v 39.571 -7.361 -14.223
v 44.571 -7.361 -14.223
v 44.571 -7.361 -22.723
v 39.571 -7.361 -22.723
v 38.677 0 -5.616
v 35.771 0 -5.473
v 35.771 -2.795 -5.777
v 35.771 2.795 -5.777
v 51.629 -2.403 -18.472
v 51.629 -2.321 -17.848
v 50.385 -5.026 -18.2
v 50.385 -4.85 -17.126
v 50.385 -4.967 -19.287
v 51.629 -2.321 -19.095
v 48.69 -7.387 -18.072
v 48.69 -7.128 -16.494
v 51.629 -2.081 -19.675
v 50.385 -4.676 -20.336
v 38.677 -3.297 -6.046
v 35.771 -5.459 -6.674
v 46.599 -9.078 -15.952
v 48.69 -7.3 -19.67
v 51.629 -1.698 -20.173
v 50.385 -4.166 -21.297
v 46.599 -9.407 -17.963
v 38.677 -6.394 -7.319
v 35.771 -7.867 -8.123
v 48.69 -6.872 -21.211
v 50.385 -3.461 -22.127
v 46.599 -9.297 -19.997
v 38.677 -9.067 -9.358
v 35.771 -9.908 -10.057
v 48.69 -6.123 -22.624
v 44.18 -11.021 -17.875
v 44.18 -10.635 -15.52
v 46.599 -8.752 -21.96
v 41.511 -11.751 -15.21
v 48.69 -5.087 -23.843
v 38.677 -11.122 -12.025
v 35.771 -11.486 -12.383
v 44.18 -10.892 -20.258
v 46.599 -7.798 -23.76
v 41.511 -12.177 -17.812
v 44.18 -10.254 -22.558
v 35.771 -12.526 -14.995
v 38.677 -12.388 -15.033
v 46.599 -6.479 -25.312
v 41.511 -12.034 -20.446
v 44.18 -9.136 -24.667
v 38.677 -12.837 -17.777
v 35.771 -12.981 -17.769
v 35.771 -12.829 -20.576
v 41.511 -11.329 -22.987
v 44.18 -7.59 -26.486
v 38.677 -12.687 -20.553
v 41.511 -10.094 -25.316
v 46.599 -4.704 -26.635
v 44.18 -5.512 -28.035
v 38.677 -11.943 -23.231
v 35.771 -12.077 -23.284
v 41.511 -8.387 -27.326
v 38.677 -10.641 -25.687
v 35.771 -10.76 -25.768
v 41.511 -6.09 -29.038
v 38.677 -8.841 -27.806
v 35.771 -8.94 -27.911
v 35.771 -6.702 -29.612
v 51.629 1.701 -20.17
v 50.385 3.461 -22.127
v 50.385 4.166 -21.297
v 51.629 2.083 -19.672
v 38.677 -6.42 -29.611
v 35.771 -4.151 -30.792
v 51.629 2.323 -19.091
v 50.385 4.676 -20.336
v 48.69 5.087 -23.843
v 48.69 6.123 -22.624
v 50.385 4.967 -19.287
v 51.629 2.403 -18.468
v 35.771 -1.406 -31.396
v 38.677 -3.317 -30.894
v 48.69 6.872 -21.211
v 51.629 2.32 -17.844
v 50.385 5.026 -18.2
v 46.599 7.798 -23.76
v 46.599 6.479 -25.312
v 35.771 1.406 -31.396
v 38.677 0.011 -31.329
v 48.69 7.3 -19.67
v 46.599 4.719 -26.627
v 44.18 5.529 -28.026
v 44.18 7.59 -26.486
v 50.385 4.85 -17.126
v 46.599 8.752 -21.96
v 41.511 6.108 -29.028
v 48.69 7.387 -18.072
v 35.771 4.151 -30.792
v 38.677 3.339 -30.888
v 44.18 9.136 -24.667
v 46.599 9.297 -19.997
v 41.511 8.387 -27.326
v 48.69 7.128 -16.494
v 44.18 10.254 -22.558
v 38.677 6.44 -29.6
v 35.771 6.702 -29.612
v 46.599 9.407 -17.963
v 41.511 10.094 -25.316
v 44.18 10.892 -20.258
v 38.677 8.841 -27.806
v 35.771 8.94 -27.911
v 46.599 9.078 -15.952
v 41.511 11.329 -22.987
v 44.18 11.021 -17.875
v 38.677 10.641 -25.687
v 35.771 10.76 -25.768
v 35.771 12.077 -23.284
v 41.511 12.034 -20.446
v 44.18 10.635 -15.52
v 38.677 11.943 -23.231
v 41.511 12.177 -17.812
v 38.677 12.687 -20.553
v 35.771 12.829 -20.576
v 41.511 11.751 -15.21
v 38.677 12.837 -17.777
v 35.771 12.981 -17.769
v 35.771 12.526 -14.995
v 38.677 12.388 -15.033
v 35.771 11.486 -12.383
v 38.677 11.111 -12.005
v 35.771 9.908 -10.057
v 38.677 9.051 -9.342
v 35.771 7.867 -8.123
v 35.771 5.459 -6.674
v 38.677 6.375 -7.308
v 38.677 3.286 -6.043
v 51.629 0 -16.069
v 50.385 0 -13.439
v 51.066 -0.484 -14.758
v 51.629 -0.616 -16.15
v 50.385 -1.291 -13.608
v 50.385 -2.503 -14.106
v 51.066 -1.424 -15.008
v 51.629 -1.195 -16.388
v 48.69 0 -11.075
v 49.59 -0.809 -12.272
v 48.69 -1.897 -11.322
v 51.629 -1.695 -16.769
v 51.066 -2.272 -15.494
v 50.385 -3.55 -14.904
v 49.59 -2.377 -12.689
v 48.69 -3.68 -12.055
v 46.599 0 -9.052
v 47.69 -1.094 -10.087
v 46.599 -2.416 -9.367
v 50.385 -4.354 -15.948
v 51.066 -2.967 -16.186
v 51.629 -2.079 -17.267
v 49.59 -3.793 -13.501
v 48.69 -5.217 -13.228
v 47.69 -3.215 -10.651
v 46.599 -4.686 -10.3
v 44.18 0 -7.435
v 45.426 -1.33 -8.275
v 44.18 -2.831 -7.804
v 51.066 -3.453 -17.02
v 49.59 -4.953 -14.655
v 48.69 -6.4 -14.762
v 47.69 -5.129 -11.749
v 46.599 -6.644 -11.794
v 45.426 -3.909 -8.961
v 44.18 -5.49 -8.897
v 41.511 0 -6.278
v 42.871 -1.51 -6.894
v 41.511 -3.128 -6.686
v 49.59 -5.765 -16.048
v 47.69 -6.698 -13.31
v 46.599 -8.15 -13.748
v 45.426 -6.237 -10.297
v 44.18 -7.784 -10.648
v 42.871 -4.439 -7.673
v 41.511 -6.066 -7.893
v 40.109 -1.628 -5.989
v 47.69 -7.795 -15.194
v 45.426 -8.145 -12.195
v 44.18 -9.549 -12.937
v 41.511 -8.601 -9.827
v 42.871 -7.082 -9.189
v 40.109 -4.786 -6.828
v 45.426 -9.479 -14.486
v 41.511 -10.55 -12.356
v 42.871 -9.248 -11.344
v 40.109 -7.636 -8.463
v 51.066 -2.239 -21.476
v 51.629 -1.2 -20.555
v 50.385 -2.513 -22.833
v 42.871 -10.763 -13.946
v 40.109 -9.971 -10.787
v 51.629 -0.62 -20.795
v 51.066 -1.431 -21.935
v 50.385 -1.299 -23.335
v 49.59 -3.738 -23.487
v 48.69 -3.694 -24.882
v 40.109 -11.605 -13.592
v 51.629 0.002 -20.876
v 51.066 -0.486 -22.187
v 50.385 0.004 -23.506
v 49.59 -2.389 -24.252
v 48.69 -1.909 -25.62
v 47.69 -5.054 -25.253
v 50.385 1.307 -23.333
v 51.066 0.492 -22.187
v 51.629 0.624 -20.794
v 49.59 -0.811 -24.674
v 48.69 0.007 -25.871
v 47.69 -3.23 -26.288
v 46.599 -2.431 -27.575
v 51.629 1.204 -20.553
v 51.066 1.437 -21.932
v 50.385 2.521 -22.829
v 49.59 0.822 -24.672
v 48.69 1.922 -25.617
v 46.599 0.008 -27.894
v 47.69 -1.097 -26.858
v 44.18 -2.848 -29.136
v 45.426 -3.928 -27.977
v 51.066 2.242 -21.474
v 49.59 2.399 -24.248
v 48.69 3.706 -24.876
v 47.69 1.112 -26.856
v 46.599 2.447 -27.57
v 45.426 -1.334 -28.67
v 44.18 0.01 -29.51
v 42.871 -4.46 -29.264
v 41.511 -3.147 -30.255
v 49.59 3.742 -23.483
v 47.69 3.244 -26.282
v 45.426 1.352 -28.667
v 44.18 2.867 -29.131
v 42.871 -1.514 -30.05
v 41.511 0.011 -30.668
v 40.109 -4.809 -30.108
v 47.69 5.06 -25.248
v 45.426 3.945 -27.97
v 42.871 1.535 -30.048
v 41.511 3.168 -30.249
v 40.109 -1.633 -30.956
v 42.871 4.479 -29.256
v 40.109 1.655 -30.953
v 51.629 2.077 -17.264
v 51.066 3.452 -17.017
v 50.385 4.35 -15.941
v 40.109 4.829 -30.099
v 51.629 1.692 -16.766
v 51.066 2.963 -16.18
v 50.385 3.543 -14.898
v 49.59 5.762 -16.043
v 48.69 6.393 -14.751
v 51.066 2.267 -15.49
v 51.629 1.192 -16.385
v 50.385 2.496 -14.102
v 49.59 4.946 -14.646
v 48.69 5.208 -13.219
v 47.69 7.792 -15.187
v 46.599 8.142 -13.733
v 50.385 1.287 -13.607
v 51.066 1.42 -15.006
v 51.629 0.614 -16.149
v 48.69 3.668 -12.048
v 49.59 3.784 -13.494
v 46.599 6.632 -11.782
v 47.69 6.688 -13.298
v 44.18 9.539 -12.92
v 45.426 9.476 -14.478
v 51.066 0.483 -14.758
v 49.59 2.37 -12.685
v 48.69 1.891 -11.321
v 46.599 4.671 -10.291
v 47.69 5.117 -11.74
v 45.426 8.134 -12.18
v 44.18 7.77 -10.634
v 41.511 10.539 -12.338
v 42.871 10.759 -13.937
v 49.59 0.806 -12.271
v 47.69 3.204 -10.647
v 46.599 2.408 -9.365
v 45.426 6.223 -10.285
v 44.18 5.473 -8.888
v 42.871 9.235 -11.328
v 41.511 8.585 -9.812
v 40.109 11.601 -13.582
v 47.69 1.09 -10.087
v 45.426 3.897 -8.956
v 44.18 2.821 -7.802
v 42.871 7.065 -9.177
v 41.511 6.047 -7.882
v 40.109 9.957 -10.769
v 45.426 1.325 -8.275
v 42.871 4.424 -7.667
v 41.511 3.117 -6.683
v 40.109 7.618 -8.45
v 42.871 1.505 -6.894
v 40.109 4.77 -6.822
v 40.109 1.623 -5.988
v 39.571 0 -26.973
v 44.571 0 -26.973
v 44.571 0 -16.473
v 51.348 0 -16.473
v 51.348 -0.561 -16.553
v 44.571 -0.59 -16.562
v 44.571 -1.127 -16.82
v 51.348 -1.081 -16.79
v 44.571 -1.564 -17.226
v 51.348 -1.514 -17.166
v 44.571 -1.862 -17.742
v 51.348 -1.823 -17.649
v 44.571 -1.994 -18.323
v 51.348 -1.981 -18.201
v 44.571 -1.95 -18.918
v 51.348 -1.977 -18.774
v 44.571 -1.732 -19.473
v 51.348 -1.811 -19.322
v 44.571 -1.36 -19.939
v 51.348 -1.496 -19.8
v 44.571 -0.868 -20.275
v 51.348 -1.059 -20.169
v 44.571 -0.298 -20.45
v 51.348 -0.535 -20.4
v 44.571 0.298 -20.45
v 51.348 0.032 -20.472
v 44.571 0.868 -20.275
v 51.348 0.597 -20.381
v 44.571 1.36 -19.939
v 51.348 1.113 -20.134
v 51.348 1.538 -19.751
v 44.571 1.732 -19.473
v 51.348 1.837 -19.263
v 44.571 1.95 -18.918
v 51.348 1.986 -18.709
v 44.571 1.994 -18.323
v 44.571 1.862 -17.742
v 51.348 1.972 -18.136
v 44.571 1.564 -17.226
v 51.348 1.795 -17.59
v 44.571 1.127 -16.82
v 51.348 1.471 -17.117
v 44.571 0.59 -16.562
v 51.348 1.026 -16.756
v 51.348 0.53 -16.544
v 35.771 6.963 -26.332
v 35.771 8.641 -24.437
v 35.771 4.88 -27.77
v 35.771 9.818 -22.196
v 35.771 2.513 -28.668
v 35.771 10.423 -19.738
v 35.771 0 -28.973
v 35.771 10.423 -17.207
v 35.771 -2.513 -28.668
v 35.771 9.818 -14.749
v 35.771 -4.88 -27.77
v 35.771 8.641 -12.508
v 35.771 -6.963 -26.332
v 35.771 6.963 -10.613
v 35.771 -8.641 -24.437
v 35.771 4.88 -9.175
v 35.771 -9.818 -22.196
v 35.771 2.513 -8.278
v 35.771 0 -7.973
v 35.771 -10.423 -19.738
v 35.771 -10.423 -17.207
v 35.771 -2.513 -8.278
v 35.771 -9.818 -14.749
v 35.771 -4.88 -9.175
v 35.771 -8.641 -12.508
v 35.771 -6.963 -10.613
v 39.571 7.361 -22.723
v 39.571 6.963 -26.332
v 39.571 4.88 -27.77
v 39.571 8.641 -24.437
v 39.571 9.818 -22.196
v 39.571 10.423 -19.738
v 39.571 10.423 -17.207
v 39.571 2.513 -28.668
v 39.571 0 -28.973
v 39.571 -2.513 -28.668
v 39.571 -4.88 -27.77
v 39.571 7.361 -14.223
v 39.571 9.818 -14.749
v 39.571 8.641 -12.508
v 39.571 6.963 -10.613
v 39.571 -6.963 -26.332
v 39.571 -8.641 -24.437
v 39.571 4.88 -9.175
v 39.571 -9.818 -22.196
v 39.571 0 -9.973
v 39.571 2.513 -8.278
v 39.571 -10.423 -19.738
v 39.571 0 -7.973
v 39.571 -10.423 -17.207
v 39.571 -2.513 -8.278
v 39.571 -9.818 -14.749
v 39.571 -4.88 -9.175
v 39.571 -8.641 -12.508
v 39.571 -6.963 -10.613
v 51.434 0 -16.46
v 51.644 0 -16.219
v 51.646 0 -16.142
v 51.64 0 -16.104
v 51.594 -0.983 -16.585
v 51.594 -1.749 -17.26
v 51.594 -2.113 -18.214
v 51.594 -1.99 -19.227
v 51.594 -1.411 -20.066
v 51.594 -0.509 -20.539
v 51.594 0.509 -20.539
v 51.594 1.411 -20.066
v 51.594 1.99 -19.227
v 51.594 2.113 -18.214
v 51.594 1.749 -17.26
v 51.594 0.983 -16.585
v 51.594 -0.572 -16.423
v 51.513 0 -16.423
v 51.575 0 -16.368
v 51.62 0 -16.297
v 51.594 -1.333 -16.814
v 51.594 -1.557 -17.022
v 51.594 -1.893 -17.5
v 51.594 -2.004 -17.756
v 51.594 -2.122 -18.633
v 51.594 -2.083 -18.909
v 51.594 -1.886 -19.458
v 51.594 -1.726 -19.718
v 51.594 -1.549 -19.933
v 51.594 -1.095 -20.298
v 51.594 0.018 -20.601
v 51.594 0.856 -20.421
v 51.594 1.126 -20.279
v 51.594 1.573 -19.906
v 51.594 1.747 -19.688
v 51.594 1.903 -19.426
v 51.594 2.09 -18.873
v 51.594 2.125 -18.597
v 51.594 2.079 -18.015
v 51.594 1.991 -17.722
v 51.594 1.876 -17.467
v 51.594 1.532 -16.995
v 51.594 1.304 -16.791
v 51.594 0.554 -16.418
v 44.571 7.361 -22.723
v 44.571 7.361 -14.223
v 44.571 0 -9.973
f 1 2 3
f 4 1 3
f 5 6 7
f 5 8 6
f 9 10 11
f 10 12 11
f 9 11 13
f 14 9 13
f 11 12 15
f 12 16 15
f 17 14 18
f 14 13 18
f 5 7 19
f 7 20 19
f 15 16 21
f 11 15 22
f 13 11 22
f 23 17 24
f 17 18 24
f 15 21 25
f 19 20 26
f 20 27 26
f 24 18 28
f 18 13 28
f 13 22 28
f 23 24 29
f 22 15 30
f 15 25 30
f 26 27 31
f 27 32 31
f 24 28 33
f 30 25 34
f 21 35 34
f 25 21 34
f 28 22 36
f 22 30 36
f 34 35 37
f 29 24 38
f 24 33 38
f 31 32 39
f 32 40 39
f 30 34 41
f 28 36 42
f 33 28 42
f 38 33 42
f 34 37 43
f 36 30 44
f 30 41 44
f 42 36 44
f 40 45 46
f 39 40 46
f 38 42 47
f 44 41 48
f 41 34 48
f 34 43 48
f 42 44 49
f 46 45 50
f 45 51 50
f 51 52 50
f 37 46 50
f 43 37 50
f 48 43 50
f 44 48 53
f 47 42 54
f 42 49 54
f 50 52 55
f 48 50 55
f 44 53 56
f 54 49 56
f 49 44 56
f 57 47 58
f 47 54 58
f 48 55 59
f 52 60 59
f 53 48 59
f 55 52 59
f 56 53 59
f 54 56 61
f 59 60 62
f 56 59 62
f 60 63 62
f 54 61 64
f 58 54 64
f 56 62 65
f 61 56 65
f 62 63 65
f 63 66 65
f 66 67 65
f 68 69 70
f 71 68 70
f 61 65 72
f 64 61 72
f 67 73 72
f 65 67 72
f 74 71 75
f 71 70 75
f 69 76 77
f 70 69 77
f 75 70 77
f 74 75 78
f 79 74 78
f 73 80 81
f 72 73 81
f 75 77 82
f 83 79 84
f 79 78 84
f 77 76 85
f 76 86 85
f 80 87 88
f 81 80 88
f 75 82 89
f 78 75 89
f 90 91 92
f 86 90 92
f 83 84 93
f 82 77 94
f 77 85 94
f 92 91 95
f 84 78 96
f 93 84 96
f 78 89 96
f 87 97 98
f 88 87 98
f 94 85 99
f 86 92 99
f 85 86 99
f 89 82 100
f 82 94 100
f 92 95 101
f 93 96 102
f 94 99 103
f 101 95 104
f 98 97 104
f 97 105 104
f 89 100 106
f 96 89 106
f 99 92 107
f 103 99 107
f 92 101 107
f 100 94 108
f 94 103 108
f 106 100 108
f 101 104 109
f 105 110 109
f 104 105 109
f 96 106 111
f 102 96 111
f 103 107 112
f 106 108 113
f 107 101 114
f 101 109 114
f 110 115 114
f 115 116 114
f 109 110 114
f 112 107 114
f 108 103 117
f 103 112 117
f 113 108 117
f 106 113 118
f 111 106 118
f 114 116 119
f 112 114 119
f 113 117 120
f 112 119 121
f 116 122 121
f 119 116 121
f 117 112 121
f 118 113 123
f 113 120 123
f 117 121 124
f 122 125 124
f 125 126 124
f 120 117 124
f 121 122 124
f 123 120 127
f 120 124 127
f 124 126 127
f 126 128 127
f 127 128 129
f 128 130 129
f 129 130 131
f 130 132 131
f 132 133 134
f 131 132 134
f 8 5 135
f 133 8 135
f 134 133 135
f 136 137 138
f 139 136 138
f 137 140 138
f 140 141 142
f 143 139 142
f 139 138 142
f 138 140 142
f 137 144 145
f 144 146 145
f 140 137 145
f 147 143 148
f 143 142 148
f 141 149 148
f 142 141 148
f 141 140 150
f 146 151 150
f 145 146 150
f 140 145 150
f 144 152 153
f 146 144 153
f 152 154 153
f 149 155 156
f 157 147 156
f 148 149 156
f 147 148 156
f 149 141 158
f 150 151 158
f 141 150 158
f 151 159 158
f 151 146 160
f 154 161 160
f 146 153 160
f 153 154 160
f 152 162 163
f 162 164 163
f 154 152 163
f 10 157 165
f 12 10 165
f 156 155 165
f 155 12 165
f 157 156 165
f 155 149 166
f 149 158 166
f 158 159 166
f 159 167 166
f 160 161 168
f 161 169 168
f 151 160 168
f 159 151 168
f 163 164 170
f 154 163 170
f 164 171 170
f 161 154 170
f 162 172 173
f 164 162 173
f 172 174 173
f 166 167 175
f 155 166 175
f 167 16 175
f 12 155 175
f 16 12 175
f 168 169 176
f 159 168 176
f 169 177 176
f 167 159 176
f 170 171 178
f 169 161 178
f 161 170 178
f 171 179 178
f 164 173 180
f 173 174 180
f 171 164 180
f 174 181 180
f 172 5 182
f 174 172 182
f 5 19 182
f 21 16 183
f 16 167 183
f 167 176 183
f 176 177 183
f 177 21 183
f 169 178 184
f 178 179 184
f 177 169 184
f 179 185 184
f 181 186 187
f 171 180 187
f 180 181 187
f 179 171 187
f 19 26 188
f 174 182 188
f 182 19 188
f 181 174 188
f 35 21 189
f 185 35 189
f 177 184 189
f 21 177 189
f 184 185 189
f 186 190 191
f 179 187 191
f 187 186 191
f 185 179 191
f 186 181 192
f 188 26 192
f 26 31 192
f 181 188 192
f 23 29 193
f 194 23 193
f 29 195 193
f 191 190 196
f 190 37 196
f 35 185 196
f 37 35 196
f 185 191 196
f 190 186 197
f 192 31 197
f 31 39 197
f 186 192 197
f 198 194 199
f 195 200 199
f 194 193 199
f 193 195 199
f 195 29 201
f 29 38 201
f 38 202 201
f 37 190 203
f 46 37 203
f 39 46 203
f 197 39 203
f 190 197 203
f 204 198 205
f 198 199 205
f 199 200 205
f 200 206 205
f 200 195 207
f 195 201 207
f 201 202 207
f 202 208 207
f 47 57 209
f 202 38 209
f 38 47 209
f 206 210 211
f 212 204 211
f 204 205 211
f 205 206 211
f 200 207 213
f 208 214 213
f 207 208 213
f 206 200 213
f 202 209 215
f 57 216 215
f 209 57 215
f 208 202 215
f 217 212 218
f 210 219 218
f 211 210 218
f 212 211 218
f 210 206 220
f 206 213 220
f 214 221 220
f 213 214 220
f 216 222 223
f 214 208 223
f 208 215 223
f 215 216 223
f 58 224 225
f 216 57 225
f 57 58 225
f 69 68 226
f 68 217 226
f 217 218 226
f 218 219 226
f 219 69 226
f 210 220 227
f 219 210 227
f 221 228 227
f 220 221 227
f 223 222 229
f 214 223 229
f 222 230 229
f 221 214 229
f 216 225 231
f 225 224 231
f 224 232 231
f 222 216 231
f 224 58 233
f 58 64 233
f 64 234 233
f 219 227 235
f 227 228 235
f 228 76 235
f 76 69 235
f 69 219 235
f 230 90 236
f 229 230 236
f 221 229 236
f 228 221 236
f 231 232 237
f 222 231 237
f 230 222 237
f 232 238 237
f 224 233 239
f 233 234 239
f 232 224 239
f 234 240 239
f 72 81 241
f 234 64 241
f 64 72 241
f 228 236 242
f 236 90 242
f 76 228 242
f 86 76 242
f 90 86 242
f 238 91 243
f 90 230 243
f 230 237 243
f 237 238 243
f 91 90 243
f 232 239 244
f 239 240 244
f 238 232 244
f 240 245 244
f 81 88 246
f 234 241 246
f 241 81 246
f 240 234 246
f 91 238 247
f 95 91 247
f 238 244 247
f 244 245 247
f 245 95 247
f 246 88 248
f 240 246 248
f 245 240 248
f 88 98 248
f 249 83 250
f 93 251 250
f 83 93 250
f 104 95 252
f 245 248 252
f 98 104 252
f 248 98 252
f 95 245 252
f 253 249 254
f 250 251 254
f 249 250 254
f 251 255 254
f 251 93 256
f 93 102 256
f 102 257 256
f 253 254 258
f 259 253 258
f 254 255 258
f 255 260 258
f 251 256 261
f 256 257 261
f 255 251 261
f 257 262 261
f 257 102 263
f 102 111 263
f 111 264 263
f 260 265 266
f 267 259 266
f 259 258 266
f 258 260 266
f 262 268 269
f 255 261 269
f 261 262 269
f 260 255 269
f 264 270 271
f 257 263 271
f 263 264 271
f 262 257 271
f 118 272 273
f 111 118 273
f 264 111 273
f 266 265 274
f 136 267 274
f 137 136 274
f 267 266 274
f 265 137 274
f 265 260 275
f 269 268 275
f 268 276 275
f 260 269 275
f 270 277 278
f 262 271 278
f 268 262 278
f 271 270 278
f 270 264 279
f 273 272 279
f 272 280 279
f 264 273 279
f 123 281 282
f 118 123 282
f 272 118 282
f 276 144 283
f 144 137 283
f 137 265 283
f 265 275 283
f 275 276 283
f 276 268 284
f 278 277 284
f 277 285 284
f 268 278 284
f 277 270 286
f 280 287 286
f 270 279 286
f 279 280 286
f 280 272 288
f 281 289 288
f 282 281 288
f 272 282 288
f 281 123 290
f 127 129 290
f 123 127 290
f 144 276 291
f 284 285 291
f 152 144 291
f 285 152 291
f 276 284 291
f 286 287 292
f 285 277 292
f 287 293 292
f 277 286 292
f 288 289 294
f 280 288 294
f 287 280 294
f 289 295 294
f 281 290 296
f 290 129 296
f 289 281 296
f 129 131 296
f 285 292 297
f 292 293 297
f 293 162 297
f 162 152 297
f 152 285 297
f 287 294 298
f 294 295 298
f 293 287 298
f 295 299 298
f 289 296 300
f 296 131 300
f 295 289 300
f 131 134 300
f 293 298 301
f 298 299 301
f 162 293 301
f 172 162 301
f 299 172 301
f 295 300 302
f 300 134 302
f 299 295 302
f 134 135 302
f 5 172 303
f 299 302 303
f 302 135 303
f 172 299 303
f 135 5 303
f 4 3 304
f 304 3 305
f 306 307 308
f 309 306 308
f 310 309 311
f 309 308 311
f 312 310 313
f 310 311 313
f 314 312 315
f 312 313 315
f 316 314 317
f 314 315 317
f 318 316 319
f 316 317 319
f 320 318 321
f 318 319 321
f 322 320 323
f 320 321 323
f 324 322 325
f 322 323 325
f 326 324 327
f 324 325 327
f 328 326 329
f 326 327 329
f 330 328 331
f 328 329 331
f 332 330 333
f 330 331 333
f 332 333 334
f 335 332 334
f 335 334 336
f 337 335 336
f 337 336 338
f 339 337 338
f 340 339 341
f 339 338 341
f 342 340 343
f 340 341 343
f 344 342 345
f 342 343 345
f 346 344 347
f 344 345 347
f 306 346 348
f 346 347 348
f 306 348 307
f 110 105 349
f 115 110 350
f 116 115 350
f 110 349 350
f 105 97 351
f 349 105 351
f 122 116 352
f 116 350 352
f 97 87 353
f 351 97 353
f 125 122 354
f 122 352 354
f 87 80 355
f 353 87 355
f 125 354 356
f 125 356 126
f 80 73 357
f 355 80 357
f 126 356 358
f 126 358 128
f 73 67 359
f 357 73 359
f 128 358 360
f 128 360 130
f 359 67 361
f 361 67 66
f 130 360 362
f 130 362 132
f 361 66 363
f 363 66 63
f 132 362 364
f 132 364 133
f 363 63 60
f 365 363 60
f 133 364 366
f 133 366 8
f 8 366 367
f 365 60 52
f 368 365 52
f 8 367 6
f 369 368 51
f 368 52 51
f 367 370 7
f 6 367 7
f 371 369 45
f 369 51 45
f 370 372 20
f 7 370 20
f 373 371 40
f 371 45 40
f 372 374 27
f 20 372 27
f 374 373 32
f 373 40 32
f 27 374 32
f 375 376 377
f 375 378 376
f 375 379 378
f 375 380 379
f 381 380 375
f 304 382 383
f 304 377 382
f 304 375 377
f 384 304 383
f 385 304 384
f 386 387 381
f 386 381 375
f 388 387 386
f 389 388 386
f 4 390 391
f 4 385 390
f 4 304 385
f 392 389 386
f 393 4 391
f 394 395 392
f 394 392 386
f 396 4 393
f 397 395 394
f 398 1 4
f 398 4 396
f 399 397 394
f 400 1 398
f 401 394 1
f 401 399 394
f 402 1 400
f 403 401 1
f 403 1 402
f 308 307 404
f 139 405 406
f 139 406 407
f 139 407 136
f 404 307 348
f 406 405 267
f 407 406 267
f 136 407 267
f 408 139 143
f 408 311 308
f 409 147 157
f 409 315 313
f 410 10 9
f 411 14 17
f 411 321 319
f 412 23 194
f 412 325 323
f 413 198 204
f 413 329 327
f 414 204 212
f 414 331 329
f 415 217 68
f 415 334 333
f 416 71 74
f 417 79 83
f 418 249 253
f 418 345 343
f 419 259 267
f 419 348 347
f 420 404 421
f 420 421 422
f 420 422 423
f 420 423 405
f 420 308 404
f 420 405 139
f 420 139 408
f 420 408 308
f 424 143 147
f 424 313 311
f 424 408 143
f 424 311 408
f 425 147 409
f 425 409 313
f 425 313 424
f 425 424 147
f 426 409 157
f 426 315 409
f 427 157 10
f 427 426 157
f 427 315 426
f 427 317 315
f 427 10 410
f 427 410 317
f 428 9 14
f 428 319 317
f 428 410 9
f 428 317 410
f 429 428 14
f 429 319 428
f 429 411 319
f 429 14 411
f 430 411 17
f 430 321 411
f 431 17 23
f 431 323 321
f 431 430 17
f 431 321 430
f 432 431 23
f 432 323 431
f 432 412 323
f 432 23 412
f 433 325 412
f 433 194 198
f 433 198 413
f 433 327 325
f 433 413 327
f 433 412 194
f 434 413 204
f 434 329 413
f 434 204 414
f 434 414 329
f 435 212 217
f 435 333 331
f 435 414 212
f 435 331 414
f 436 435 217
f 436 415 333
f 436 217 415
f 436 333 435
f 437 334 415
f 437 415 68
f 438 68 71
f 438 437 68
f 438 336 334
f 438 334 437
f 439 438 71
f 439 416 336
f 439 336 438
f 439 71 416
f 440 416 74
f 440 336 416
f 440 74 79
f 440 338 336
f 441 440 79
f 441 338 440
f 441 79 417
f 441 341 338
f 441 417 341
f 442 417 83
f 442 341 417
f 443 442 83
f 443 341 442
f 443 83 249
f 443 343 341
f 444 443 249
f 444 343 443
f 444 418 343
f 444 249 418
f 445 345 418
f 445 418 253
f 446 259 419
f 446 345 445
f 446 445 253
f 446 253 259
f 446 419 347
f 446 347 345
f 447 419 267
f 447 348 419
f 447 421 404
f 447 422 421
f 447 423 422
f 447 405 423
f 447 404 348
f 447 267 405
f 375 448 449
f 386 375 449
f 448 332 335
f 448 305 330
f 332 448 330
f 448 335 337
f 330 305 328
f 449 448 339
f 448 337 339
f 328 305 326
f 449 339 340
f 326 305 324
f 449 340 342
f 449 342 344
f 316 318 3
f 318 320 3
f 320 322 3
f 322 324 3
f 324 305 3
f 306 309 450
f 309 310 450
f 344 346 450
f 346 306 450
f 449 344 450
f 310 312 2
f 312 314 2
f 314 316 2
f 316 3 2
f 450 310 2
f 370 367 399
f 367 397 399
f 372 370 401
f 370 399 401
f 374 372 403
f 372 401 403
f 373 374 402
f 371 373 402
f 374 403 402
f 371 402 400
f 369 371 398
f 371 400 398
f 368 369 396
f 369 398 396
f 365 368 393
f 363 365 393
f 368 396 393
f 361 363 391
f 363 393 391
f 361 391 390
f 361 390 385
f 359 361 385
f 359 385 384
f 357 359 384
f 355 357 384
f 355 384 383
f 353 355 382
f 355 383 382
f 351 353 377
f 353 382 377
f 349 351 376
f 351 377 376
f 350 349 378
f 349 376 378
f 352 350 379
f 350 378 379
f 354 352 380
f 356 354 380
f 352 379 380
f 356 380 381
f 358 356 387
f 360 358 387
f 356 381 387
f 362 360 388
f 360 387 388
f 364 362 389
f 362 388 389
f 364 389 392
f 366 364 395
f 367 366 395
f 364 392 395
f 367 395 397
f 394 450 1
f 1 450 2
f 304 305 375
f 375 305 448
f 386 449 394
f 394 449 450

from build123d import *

# Parameters (mm, degrees)
F2_R     = 0.3
F4_DEPTH = 5


with BuildPart() as f1:
    # F0 (on Front) → F1 (revolve)
    with BuildSketch(Plane.XZ):
        with BuildLine():
            Line((44.5714133582, -16.4726869262), (51.7714133582, -16.4726869262))
            ThreePointArc((51.7714133582, -16.4726869262), (45.6026739754, -8.3090351195), (35.7714133582, -5.4726869262))
            Line((35.7714133582, -5.4726869262), (35.7714133582, -7.9726869262))
            Line((35.7714133582, -7.9726869262), (39.5714133582, -7.9726869262))
            Line((39.5714133582, -7.9726869262), (39.5714133582, -9.9726869262))
            Line((39.5714133582, -9.9726869262), (44.5714133582, -9.9726869262))
            Line((44.5714133582, -9.9726869262), (44.5714133582, -16.4726869262))
        make_face()
    revolve(axis=Axis((45.5371495336, 0, -18.4726869262), (1, 0, 0)))

    # F2
    f2_edges = [f1.edges().sort_by_distance(p)[0] for p in [
        (51.771413, 0, -20.472687),
    ]]
    fillet(f2_edges, radius=F2_R)

    # F3 (on face) → F4 (join)
    with BuildSketch(Plane(origin=(44.5714133582, 0, 0), x_dir=(0, -1, 0), z_dir=(-1, 0, 0))):
        with BuildLine():
            Line((0, -9.9726869262), (7.3612159322, -14.2226869262))
            ThreePointArc((7.3612159322, -14.2226869262), (4.25, -11.1114709941), (0, -9.9726869262))
        make_face()
        with BuildLine():
            Line((-7.3612159322, -14.2226869262), (0, -9.9726869262))
            ThreePointArc((0, -9.9726869262), (-4.25, -11.1114709941), (-7.3612159322, -14.2226869262))
        make_face()
        with BuildLine():
            Line((-7.3612159322, -22.7226869262), (-7.3612159322, -14.2226869262))
            ThreePointArc((-7.3612159322, -14.2226869262), (-8.5, -18.4726869262), (-7.3612159322, -22.7226869262))
        make_face()
        with BuildLine():
            ThreePointArc((-7.3612159322, -22.7226869262), (-4.25, -25.8339028584), (0, -26.9726869262))
            Line((0, -26.9726869262), (-7.3612159322, -22.7226869262))
        make_face()
        with BuildLine():
            ThreePointArc((0, -26.9726869262), (4.25, -25.8339028584), (7.3612159322, -22.7226869262))
            Line((7.3612159322, -22.7226869262), (0, -26.9726869262))
        make_face()
        with BuildLine():
            ThreePointArc((7.3612159322, -22.7226869262), (8.2103695235, -20.6726488096), (8.5, -18.4726869262))
            ThreePointArc((8.5, -18.4726869262), (8.2103695235, -16.2727250429), (7.3612159322, -14.2226869262))
            Line((7.3612159322, -14.2226869262), (7.3612159322, -22.7226869262))
        make_face()
    extrude(amount=F4_DEPTH)


solid = f1.part
